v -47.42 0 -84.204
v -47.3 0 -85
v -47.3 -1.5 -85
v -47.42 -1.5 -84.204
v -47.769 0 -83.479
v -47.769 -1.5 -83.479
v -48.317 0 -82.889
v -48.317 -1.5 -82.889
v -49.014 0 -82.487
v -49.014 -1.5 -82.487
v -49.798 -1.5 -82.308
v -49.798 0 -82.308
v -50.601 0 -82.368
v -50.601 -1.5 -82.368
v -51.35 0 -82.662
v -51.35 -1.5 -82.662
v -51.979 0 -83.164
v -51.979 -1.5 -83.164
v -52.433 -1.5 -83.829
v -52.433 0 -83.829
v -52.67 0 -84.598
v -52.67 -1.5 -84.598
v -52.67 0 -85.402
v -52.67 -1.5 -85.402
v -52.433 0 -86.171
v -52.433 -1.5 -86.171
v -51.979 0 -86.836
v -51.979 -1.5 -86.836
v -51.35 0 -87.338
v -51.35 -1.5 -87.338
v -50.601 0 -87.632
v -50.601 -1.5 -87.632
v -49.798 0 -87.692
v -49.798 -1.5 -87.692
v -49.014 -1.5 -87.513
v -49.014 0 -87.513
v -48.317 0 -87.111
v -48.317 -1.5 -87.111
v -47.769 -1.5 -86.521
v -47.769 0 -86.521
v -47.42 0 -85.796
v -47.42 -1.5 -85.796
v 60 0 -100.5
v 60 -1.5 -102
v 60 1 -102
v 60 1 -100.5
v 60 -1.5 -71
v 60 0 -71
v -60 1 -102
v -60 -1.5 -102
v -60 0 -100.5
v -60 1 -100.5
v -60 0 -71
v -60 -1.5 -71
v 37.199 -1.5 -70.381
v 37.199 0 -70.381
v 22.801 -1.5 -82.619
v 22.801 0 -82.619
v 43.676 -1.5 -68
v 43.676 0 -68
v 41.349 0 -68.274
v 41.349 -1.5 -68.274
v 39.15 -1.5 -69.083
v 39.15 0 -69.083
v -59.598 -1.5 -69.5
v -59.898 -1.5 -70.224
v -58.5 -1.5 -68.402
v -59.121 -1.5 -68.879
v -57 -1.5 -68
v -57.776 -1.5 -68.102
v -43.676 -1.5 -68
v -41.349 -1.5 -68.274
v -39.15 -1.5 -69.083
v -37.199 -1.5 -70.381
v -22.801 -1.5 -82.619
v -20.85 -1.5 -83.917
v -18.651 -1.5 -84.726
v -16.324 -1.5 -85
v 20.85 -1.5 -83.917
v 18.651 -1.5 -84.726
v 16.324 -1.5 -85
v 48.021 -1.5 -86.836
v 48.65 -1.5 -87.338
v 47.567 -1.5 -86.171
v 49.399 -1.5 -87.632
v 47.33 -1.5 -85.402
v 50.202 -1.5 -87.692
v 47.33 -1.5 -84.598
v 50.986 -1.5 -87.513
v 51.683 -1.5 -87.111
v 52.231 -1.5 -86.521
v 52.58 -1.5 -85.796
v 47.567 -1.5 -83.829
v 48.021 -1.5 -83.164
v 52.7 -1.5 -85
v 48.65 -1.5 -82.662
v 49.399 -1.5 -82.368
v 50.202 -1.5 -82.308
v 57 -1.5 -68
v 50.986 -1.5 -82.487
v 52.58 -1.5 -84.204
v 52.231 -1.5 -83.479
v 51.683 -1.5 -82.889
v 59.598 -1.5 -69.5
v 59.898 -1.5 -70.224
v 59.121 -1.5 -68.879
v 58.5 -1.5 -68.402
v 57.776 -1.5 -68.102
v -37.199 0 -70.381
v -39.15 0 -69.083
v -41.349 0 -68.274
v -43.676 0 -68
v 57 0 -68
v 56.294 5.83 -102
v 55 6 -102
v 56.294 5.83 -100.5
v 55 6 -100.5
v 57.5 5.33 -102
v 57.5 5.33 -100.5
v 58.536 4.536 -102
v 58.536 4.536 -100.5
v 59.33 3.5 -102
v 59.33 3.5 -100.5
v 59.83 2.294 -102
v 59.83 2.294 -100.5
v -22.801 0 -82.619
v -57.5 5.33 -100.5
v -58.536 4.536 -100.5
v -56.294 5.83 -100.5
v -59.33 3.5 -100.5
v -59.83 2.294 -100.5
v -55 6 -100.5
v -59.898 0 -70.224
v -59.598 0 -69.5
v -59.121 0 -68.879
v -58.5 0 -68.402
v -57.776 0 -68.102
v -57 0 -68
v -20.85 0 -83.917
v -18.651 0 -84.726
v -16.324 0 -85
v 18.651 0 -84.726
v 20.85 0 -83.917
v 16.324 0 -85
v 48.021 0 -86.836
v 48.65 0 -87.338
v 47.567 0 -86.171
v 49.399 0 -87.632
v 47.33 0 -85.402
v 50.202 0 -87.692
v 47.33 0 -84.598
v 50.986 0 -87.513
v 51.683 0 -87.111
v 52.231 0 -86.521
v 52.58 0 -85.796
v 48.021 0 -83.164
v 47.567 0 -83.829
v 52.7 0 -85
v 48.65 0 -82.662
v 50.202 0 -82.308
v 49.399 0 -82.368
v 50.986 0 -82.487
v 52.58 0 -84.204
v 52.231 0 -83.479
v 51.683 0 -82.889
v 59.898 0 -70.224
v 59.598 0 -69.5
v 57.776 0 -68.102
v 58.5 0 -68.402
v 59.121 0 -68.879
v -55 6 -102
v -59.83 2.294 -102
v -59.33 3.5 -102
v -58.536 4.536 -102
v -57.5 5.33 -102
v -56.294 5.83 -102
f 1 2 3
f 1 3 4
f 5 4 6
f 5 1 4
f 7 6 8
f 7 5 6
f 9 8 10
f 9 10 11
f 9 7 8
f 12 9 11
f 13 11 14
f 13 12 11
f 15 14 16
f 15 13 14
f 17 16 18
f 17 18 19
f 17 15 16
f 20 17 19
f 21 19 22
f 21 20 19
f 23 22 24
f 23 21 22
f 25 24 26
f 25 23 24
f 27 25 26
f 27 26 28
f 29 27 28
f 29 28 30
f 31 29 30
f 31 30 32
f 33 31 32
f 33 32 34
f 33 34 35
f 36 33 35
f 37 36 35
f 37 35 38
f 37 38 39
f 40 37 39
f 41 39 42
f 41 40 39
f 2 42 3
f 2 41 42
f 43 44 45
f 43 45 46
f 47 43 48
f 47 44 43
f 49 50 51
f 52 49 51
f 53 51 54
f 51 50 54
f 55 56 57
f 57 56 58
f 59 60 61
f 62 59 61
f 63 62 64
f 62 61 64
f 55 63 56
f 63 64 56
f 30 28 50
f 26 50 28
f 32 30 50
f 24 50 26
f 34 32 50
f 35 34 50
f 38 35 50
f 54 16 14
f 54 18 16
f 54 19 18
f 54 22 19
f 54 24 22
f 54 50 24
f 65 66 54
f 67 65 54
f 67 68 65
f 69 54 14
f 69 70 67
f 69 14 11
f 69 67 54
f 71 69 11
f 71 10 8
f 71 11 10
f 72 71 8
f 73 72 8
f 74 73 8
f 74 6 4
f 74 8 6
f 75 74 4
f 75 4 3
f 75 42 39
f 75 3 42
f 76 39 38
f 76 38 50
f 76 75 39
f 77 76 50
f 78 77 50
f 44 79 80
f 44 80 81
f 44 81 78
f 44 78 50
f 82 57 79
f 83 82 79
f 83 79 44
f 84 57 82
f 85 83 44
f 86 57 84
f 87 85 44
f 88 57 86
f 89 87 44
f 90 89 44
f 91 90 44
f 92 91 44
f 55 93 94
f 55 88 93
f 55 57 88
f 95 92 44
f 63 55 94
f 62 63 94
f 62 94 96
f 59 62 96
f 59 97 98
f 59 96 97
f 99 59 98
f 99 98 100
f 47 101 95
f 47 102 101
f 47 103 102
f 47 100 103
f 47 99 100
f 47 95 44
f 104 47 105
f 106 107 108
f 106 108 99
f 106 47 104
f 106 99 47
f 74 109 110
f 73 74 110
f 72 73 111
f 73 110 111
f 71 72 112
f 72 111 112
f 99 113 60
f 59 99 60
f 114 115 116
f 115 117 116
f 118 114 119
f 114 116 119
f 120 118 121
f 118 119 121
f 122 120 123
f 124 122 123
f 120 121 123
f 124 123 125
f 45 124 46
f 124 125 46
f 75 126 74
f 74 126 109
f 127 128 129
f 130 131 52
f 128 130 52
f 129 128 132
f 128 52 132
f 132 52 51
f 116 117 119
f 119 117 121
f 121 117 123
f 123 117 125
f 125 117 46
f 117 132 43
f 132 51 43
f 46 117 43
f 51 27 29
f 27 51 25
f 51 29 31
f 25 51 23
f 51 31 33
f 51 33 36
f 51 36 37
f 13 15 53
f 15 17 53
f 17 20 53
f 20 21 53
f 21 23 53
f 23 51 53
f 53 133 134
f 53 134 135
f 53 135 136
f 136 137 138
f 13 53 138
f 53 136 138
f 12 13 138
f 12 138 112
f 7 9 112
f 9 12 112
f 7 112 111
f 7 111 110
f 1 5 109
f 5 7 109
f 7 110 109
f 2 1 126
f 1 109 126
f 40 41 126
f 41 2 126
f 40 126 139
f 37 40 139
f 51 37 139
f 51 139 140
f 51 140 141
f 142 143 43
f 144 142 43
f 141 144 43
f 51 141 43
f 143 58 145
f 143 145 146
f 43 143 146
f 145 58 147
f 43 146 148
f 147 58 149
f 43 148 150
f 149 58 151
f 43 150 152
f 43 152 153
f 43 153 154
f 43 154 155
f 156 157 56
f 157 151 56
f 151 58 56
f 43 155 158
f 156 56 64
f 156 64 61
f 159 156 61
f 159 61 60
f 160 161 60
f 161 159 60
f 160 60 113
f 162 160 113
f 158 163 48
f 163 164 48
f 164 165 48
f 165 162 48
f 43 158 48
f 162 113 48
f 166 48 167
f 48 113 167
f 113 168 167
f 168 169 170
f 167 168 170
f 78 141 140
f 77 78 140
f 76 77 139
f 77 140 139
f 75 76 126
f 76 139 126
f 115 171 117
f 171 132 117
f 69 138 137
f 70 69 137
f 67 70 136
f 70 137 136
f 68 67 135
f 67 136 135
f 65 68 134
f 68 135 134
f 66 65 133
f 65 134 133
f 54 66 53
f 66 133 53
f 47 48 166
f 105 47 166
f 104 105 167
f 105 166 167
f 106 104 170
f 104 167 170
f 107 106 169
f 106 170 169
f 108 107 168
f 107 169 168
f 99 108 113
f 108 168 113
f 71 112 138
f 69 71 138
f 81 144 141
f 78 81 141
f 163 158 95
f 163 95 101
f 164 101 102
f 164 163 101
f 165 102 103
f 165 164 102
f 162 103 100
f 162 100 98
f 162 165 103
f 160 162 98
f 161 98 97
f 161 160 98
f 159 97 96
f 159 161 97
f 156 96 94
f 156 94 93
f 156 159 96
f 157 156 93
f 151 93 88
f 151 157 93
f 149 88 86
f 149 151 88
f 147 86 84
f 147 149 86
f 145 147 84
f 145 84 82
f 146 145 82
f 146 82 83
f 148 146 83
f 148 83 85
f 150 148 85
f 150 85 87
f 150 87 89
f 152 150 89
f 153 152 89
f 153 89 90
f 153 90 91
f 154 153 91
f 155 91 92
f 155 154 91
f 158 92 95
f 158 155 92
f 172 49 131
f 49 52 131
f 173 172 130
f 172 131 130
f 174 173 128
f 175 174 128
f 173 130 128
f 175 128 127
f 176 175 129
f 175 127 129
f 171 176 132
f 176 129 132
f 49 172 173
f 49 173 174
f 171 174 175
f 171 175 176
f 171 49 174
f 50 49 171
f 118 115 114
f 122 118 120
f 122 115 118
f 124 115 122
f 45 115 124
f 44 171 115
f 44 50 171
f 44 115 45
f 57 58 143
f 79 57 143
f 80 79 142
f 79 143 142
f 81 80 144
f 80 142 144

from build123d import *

# Parameters (mm, degrees)
F0_R     = 2.7
F1_DEPTH = 1.5
F2_W     = 120
F2_H     = 1.5
F3_DEPTH = 7.5
F4_R     = 5


with BuildPart() as f1:
    # F0 (on Front) → F1 (new body)
    with BuildSketch(Plane.XZ):
        with BuildLine():
            Line((-60, -71), (-60, -73.654599))
            ThreePointArc((-60, -73.654599), (0, -95), (60, -73.654599))
            Line((60, -73.654599), (60, -71))
            ThreePointArc((60, -71), (59.12132, -68.87868), (57, -68))
            Line((57, -68), (43.67577, -68))
            ThreePointArc((43.67577, -68), (40.225693, -68.614002), (37.199286, -70.380607))
            Line((37.199286, -70.380607), (22.800714, -82.619393))
            ThreePointArc((22.800714, -82.619393), (19.774307, -84.385998), (16.32423, -85))
            Line((16.32423, -85), (0, -85))
            Line((0, -85), (-16.32423, -85))
            ThreePointArc((-16.32423, -85), (-19.774307, -84.385998), (-22.800714, -82.619393))
            Line((-22.800714, -82.619393), (-37.199286, -70.380607))
            ThreePointArc((-37.199286, -70.380607), (-40.225693, -68.614002), (-43.67577, -68))
            Line((-43.67577, -68), (-57, -68))
            ThreePointArc((-57, -68), (-59.12132, -68.87868), (-60, -71))
        make_face()
        with BuildLine():
            ThreePointArc((60, -73.654599), (0, -95), (-60, -73.654599))
            Line((-60, -73.654599), (-60, -102))
            Line((-60, -102), (60, -102))
            Line((60, -102), (60, -73.654599))
        make_face()
        with Locations((-50, -85)):
            Circle(F0_R, mode=Mode.SUBTRACT)
        with Locations((50, -85)):
            Circle(F0_R, mode=Mode.SUBTRACT)
    extrude(amount=F1_DEPTH)

    # F2 (on face) → F3 (join)
    with BuildSketch(Plane.XZ.offset(1.5)):
        with Locations((0, -101.25)):
            Rectangle(F2_W, F2_H)
    extrude(amount=-F3_DEPTH)

    # F4
    f4_edges = [f1.edges().sort_by_distance(p)[0] for p in [
        (60, 6, -101.25),
        (-60, 6, -101.25),
    ]]
    fillet(f4_edges, radius=F4_R)


solid = f1.part
